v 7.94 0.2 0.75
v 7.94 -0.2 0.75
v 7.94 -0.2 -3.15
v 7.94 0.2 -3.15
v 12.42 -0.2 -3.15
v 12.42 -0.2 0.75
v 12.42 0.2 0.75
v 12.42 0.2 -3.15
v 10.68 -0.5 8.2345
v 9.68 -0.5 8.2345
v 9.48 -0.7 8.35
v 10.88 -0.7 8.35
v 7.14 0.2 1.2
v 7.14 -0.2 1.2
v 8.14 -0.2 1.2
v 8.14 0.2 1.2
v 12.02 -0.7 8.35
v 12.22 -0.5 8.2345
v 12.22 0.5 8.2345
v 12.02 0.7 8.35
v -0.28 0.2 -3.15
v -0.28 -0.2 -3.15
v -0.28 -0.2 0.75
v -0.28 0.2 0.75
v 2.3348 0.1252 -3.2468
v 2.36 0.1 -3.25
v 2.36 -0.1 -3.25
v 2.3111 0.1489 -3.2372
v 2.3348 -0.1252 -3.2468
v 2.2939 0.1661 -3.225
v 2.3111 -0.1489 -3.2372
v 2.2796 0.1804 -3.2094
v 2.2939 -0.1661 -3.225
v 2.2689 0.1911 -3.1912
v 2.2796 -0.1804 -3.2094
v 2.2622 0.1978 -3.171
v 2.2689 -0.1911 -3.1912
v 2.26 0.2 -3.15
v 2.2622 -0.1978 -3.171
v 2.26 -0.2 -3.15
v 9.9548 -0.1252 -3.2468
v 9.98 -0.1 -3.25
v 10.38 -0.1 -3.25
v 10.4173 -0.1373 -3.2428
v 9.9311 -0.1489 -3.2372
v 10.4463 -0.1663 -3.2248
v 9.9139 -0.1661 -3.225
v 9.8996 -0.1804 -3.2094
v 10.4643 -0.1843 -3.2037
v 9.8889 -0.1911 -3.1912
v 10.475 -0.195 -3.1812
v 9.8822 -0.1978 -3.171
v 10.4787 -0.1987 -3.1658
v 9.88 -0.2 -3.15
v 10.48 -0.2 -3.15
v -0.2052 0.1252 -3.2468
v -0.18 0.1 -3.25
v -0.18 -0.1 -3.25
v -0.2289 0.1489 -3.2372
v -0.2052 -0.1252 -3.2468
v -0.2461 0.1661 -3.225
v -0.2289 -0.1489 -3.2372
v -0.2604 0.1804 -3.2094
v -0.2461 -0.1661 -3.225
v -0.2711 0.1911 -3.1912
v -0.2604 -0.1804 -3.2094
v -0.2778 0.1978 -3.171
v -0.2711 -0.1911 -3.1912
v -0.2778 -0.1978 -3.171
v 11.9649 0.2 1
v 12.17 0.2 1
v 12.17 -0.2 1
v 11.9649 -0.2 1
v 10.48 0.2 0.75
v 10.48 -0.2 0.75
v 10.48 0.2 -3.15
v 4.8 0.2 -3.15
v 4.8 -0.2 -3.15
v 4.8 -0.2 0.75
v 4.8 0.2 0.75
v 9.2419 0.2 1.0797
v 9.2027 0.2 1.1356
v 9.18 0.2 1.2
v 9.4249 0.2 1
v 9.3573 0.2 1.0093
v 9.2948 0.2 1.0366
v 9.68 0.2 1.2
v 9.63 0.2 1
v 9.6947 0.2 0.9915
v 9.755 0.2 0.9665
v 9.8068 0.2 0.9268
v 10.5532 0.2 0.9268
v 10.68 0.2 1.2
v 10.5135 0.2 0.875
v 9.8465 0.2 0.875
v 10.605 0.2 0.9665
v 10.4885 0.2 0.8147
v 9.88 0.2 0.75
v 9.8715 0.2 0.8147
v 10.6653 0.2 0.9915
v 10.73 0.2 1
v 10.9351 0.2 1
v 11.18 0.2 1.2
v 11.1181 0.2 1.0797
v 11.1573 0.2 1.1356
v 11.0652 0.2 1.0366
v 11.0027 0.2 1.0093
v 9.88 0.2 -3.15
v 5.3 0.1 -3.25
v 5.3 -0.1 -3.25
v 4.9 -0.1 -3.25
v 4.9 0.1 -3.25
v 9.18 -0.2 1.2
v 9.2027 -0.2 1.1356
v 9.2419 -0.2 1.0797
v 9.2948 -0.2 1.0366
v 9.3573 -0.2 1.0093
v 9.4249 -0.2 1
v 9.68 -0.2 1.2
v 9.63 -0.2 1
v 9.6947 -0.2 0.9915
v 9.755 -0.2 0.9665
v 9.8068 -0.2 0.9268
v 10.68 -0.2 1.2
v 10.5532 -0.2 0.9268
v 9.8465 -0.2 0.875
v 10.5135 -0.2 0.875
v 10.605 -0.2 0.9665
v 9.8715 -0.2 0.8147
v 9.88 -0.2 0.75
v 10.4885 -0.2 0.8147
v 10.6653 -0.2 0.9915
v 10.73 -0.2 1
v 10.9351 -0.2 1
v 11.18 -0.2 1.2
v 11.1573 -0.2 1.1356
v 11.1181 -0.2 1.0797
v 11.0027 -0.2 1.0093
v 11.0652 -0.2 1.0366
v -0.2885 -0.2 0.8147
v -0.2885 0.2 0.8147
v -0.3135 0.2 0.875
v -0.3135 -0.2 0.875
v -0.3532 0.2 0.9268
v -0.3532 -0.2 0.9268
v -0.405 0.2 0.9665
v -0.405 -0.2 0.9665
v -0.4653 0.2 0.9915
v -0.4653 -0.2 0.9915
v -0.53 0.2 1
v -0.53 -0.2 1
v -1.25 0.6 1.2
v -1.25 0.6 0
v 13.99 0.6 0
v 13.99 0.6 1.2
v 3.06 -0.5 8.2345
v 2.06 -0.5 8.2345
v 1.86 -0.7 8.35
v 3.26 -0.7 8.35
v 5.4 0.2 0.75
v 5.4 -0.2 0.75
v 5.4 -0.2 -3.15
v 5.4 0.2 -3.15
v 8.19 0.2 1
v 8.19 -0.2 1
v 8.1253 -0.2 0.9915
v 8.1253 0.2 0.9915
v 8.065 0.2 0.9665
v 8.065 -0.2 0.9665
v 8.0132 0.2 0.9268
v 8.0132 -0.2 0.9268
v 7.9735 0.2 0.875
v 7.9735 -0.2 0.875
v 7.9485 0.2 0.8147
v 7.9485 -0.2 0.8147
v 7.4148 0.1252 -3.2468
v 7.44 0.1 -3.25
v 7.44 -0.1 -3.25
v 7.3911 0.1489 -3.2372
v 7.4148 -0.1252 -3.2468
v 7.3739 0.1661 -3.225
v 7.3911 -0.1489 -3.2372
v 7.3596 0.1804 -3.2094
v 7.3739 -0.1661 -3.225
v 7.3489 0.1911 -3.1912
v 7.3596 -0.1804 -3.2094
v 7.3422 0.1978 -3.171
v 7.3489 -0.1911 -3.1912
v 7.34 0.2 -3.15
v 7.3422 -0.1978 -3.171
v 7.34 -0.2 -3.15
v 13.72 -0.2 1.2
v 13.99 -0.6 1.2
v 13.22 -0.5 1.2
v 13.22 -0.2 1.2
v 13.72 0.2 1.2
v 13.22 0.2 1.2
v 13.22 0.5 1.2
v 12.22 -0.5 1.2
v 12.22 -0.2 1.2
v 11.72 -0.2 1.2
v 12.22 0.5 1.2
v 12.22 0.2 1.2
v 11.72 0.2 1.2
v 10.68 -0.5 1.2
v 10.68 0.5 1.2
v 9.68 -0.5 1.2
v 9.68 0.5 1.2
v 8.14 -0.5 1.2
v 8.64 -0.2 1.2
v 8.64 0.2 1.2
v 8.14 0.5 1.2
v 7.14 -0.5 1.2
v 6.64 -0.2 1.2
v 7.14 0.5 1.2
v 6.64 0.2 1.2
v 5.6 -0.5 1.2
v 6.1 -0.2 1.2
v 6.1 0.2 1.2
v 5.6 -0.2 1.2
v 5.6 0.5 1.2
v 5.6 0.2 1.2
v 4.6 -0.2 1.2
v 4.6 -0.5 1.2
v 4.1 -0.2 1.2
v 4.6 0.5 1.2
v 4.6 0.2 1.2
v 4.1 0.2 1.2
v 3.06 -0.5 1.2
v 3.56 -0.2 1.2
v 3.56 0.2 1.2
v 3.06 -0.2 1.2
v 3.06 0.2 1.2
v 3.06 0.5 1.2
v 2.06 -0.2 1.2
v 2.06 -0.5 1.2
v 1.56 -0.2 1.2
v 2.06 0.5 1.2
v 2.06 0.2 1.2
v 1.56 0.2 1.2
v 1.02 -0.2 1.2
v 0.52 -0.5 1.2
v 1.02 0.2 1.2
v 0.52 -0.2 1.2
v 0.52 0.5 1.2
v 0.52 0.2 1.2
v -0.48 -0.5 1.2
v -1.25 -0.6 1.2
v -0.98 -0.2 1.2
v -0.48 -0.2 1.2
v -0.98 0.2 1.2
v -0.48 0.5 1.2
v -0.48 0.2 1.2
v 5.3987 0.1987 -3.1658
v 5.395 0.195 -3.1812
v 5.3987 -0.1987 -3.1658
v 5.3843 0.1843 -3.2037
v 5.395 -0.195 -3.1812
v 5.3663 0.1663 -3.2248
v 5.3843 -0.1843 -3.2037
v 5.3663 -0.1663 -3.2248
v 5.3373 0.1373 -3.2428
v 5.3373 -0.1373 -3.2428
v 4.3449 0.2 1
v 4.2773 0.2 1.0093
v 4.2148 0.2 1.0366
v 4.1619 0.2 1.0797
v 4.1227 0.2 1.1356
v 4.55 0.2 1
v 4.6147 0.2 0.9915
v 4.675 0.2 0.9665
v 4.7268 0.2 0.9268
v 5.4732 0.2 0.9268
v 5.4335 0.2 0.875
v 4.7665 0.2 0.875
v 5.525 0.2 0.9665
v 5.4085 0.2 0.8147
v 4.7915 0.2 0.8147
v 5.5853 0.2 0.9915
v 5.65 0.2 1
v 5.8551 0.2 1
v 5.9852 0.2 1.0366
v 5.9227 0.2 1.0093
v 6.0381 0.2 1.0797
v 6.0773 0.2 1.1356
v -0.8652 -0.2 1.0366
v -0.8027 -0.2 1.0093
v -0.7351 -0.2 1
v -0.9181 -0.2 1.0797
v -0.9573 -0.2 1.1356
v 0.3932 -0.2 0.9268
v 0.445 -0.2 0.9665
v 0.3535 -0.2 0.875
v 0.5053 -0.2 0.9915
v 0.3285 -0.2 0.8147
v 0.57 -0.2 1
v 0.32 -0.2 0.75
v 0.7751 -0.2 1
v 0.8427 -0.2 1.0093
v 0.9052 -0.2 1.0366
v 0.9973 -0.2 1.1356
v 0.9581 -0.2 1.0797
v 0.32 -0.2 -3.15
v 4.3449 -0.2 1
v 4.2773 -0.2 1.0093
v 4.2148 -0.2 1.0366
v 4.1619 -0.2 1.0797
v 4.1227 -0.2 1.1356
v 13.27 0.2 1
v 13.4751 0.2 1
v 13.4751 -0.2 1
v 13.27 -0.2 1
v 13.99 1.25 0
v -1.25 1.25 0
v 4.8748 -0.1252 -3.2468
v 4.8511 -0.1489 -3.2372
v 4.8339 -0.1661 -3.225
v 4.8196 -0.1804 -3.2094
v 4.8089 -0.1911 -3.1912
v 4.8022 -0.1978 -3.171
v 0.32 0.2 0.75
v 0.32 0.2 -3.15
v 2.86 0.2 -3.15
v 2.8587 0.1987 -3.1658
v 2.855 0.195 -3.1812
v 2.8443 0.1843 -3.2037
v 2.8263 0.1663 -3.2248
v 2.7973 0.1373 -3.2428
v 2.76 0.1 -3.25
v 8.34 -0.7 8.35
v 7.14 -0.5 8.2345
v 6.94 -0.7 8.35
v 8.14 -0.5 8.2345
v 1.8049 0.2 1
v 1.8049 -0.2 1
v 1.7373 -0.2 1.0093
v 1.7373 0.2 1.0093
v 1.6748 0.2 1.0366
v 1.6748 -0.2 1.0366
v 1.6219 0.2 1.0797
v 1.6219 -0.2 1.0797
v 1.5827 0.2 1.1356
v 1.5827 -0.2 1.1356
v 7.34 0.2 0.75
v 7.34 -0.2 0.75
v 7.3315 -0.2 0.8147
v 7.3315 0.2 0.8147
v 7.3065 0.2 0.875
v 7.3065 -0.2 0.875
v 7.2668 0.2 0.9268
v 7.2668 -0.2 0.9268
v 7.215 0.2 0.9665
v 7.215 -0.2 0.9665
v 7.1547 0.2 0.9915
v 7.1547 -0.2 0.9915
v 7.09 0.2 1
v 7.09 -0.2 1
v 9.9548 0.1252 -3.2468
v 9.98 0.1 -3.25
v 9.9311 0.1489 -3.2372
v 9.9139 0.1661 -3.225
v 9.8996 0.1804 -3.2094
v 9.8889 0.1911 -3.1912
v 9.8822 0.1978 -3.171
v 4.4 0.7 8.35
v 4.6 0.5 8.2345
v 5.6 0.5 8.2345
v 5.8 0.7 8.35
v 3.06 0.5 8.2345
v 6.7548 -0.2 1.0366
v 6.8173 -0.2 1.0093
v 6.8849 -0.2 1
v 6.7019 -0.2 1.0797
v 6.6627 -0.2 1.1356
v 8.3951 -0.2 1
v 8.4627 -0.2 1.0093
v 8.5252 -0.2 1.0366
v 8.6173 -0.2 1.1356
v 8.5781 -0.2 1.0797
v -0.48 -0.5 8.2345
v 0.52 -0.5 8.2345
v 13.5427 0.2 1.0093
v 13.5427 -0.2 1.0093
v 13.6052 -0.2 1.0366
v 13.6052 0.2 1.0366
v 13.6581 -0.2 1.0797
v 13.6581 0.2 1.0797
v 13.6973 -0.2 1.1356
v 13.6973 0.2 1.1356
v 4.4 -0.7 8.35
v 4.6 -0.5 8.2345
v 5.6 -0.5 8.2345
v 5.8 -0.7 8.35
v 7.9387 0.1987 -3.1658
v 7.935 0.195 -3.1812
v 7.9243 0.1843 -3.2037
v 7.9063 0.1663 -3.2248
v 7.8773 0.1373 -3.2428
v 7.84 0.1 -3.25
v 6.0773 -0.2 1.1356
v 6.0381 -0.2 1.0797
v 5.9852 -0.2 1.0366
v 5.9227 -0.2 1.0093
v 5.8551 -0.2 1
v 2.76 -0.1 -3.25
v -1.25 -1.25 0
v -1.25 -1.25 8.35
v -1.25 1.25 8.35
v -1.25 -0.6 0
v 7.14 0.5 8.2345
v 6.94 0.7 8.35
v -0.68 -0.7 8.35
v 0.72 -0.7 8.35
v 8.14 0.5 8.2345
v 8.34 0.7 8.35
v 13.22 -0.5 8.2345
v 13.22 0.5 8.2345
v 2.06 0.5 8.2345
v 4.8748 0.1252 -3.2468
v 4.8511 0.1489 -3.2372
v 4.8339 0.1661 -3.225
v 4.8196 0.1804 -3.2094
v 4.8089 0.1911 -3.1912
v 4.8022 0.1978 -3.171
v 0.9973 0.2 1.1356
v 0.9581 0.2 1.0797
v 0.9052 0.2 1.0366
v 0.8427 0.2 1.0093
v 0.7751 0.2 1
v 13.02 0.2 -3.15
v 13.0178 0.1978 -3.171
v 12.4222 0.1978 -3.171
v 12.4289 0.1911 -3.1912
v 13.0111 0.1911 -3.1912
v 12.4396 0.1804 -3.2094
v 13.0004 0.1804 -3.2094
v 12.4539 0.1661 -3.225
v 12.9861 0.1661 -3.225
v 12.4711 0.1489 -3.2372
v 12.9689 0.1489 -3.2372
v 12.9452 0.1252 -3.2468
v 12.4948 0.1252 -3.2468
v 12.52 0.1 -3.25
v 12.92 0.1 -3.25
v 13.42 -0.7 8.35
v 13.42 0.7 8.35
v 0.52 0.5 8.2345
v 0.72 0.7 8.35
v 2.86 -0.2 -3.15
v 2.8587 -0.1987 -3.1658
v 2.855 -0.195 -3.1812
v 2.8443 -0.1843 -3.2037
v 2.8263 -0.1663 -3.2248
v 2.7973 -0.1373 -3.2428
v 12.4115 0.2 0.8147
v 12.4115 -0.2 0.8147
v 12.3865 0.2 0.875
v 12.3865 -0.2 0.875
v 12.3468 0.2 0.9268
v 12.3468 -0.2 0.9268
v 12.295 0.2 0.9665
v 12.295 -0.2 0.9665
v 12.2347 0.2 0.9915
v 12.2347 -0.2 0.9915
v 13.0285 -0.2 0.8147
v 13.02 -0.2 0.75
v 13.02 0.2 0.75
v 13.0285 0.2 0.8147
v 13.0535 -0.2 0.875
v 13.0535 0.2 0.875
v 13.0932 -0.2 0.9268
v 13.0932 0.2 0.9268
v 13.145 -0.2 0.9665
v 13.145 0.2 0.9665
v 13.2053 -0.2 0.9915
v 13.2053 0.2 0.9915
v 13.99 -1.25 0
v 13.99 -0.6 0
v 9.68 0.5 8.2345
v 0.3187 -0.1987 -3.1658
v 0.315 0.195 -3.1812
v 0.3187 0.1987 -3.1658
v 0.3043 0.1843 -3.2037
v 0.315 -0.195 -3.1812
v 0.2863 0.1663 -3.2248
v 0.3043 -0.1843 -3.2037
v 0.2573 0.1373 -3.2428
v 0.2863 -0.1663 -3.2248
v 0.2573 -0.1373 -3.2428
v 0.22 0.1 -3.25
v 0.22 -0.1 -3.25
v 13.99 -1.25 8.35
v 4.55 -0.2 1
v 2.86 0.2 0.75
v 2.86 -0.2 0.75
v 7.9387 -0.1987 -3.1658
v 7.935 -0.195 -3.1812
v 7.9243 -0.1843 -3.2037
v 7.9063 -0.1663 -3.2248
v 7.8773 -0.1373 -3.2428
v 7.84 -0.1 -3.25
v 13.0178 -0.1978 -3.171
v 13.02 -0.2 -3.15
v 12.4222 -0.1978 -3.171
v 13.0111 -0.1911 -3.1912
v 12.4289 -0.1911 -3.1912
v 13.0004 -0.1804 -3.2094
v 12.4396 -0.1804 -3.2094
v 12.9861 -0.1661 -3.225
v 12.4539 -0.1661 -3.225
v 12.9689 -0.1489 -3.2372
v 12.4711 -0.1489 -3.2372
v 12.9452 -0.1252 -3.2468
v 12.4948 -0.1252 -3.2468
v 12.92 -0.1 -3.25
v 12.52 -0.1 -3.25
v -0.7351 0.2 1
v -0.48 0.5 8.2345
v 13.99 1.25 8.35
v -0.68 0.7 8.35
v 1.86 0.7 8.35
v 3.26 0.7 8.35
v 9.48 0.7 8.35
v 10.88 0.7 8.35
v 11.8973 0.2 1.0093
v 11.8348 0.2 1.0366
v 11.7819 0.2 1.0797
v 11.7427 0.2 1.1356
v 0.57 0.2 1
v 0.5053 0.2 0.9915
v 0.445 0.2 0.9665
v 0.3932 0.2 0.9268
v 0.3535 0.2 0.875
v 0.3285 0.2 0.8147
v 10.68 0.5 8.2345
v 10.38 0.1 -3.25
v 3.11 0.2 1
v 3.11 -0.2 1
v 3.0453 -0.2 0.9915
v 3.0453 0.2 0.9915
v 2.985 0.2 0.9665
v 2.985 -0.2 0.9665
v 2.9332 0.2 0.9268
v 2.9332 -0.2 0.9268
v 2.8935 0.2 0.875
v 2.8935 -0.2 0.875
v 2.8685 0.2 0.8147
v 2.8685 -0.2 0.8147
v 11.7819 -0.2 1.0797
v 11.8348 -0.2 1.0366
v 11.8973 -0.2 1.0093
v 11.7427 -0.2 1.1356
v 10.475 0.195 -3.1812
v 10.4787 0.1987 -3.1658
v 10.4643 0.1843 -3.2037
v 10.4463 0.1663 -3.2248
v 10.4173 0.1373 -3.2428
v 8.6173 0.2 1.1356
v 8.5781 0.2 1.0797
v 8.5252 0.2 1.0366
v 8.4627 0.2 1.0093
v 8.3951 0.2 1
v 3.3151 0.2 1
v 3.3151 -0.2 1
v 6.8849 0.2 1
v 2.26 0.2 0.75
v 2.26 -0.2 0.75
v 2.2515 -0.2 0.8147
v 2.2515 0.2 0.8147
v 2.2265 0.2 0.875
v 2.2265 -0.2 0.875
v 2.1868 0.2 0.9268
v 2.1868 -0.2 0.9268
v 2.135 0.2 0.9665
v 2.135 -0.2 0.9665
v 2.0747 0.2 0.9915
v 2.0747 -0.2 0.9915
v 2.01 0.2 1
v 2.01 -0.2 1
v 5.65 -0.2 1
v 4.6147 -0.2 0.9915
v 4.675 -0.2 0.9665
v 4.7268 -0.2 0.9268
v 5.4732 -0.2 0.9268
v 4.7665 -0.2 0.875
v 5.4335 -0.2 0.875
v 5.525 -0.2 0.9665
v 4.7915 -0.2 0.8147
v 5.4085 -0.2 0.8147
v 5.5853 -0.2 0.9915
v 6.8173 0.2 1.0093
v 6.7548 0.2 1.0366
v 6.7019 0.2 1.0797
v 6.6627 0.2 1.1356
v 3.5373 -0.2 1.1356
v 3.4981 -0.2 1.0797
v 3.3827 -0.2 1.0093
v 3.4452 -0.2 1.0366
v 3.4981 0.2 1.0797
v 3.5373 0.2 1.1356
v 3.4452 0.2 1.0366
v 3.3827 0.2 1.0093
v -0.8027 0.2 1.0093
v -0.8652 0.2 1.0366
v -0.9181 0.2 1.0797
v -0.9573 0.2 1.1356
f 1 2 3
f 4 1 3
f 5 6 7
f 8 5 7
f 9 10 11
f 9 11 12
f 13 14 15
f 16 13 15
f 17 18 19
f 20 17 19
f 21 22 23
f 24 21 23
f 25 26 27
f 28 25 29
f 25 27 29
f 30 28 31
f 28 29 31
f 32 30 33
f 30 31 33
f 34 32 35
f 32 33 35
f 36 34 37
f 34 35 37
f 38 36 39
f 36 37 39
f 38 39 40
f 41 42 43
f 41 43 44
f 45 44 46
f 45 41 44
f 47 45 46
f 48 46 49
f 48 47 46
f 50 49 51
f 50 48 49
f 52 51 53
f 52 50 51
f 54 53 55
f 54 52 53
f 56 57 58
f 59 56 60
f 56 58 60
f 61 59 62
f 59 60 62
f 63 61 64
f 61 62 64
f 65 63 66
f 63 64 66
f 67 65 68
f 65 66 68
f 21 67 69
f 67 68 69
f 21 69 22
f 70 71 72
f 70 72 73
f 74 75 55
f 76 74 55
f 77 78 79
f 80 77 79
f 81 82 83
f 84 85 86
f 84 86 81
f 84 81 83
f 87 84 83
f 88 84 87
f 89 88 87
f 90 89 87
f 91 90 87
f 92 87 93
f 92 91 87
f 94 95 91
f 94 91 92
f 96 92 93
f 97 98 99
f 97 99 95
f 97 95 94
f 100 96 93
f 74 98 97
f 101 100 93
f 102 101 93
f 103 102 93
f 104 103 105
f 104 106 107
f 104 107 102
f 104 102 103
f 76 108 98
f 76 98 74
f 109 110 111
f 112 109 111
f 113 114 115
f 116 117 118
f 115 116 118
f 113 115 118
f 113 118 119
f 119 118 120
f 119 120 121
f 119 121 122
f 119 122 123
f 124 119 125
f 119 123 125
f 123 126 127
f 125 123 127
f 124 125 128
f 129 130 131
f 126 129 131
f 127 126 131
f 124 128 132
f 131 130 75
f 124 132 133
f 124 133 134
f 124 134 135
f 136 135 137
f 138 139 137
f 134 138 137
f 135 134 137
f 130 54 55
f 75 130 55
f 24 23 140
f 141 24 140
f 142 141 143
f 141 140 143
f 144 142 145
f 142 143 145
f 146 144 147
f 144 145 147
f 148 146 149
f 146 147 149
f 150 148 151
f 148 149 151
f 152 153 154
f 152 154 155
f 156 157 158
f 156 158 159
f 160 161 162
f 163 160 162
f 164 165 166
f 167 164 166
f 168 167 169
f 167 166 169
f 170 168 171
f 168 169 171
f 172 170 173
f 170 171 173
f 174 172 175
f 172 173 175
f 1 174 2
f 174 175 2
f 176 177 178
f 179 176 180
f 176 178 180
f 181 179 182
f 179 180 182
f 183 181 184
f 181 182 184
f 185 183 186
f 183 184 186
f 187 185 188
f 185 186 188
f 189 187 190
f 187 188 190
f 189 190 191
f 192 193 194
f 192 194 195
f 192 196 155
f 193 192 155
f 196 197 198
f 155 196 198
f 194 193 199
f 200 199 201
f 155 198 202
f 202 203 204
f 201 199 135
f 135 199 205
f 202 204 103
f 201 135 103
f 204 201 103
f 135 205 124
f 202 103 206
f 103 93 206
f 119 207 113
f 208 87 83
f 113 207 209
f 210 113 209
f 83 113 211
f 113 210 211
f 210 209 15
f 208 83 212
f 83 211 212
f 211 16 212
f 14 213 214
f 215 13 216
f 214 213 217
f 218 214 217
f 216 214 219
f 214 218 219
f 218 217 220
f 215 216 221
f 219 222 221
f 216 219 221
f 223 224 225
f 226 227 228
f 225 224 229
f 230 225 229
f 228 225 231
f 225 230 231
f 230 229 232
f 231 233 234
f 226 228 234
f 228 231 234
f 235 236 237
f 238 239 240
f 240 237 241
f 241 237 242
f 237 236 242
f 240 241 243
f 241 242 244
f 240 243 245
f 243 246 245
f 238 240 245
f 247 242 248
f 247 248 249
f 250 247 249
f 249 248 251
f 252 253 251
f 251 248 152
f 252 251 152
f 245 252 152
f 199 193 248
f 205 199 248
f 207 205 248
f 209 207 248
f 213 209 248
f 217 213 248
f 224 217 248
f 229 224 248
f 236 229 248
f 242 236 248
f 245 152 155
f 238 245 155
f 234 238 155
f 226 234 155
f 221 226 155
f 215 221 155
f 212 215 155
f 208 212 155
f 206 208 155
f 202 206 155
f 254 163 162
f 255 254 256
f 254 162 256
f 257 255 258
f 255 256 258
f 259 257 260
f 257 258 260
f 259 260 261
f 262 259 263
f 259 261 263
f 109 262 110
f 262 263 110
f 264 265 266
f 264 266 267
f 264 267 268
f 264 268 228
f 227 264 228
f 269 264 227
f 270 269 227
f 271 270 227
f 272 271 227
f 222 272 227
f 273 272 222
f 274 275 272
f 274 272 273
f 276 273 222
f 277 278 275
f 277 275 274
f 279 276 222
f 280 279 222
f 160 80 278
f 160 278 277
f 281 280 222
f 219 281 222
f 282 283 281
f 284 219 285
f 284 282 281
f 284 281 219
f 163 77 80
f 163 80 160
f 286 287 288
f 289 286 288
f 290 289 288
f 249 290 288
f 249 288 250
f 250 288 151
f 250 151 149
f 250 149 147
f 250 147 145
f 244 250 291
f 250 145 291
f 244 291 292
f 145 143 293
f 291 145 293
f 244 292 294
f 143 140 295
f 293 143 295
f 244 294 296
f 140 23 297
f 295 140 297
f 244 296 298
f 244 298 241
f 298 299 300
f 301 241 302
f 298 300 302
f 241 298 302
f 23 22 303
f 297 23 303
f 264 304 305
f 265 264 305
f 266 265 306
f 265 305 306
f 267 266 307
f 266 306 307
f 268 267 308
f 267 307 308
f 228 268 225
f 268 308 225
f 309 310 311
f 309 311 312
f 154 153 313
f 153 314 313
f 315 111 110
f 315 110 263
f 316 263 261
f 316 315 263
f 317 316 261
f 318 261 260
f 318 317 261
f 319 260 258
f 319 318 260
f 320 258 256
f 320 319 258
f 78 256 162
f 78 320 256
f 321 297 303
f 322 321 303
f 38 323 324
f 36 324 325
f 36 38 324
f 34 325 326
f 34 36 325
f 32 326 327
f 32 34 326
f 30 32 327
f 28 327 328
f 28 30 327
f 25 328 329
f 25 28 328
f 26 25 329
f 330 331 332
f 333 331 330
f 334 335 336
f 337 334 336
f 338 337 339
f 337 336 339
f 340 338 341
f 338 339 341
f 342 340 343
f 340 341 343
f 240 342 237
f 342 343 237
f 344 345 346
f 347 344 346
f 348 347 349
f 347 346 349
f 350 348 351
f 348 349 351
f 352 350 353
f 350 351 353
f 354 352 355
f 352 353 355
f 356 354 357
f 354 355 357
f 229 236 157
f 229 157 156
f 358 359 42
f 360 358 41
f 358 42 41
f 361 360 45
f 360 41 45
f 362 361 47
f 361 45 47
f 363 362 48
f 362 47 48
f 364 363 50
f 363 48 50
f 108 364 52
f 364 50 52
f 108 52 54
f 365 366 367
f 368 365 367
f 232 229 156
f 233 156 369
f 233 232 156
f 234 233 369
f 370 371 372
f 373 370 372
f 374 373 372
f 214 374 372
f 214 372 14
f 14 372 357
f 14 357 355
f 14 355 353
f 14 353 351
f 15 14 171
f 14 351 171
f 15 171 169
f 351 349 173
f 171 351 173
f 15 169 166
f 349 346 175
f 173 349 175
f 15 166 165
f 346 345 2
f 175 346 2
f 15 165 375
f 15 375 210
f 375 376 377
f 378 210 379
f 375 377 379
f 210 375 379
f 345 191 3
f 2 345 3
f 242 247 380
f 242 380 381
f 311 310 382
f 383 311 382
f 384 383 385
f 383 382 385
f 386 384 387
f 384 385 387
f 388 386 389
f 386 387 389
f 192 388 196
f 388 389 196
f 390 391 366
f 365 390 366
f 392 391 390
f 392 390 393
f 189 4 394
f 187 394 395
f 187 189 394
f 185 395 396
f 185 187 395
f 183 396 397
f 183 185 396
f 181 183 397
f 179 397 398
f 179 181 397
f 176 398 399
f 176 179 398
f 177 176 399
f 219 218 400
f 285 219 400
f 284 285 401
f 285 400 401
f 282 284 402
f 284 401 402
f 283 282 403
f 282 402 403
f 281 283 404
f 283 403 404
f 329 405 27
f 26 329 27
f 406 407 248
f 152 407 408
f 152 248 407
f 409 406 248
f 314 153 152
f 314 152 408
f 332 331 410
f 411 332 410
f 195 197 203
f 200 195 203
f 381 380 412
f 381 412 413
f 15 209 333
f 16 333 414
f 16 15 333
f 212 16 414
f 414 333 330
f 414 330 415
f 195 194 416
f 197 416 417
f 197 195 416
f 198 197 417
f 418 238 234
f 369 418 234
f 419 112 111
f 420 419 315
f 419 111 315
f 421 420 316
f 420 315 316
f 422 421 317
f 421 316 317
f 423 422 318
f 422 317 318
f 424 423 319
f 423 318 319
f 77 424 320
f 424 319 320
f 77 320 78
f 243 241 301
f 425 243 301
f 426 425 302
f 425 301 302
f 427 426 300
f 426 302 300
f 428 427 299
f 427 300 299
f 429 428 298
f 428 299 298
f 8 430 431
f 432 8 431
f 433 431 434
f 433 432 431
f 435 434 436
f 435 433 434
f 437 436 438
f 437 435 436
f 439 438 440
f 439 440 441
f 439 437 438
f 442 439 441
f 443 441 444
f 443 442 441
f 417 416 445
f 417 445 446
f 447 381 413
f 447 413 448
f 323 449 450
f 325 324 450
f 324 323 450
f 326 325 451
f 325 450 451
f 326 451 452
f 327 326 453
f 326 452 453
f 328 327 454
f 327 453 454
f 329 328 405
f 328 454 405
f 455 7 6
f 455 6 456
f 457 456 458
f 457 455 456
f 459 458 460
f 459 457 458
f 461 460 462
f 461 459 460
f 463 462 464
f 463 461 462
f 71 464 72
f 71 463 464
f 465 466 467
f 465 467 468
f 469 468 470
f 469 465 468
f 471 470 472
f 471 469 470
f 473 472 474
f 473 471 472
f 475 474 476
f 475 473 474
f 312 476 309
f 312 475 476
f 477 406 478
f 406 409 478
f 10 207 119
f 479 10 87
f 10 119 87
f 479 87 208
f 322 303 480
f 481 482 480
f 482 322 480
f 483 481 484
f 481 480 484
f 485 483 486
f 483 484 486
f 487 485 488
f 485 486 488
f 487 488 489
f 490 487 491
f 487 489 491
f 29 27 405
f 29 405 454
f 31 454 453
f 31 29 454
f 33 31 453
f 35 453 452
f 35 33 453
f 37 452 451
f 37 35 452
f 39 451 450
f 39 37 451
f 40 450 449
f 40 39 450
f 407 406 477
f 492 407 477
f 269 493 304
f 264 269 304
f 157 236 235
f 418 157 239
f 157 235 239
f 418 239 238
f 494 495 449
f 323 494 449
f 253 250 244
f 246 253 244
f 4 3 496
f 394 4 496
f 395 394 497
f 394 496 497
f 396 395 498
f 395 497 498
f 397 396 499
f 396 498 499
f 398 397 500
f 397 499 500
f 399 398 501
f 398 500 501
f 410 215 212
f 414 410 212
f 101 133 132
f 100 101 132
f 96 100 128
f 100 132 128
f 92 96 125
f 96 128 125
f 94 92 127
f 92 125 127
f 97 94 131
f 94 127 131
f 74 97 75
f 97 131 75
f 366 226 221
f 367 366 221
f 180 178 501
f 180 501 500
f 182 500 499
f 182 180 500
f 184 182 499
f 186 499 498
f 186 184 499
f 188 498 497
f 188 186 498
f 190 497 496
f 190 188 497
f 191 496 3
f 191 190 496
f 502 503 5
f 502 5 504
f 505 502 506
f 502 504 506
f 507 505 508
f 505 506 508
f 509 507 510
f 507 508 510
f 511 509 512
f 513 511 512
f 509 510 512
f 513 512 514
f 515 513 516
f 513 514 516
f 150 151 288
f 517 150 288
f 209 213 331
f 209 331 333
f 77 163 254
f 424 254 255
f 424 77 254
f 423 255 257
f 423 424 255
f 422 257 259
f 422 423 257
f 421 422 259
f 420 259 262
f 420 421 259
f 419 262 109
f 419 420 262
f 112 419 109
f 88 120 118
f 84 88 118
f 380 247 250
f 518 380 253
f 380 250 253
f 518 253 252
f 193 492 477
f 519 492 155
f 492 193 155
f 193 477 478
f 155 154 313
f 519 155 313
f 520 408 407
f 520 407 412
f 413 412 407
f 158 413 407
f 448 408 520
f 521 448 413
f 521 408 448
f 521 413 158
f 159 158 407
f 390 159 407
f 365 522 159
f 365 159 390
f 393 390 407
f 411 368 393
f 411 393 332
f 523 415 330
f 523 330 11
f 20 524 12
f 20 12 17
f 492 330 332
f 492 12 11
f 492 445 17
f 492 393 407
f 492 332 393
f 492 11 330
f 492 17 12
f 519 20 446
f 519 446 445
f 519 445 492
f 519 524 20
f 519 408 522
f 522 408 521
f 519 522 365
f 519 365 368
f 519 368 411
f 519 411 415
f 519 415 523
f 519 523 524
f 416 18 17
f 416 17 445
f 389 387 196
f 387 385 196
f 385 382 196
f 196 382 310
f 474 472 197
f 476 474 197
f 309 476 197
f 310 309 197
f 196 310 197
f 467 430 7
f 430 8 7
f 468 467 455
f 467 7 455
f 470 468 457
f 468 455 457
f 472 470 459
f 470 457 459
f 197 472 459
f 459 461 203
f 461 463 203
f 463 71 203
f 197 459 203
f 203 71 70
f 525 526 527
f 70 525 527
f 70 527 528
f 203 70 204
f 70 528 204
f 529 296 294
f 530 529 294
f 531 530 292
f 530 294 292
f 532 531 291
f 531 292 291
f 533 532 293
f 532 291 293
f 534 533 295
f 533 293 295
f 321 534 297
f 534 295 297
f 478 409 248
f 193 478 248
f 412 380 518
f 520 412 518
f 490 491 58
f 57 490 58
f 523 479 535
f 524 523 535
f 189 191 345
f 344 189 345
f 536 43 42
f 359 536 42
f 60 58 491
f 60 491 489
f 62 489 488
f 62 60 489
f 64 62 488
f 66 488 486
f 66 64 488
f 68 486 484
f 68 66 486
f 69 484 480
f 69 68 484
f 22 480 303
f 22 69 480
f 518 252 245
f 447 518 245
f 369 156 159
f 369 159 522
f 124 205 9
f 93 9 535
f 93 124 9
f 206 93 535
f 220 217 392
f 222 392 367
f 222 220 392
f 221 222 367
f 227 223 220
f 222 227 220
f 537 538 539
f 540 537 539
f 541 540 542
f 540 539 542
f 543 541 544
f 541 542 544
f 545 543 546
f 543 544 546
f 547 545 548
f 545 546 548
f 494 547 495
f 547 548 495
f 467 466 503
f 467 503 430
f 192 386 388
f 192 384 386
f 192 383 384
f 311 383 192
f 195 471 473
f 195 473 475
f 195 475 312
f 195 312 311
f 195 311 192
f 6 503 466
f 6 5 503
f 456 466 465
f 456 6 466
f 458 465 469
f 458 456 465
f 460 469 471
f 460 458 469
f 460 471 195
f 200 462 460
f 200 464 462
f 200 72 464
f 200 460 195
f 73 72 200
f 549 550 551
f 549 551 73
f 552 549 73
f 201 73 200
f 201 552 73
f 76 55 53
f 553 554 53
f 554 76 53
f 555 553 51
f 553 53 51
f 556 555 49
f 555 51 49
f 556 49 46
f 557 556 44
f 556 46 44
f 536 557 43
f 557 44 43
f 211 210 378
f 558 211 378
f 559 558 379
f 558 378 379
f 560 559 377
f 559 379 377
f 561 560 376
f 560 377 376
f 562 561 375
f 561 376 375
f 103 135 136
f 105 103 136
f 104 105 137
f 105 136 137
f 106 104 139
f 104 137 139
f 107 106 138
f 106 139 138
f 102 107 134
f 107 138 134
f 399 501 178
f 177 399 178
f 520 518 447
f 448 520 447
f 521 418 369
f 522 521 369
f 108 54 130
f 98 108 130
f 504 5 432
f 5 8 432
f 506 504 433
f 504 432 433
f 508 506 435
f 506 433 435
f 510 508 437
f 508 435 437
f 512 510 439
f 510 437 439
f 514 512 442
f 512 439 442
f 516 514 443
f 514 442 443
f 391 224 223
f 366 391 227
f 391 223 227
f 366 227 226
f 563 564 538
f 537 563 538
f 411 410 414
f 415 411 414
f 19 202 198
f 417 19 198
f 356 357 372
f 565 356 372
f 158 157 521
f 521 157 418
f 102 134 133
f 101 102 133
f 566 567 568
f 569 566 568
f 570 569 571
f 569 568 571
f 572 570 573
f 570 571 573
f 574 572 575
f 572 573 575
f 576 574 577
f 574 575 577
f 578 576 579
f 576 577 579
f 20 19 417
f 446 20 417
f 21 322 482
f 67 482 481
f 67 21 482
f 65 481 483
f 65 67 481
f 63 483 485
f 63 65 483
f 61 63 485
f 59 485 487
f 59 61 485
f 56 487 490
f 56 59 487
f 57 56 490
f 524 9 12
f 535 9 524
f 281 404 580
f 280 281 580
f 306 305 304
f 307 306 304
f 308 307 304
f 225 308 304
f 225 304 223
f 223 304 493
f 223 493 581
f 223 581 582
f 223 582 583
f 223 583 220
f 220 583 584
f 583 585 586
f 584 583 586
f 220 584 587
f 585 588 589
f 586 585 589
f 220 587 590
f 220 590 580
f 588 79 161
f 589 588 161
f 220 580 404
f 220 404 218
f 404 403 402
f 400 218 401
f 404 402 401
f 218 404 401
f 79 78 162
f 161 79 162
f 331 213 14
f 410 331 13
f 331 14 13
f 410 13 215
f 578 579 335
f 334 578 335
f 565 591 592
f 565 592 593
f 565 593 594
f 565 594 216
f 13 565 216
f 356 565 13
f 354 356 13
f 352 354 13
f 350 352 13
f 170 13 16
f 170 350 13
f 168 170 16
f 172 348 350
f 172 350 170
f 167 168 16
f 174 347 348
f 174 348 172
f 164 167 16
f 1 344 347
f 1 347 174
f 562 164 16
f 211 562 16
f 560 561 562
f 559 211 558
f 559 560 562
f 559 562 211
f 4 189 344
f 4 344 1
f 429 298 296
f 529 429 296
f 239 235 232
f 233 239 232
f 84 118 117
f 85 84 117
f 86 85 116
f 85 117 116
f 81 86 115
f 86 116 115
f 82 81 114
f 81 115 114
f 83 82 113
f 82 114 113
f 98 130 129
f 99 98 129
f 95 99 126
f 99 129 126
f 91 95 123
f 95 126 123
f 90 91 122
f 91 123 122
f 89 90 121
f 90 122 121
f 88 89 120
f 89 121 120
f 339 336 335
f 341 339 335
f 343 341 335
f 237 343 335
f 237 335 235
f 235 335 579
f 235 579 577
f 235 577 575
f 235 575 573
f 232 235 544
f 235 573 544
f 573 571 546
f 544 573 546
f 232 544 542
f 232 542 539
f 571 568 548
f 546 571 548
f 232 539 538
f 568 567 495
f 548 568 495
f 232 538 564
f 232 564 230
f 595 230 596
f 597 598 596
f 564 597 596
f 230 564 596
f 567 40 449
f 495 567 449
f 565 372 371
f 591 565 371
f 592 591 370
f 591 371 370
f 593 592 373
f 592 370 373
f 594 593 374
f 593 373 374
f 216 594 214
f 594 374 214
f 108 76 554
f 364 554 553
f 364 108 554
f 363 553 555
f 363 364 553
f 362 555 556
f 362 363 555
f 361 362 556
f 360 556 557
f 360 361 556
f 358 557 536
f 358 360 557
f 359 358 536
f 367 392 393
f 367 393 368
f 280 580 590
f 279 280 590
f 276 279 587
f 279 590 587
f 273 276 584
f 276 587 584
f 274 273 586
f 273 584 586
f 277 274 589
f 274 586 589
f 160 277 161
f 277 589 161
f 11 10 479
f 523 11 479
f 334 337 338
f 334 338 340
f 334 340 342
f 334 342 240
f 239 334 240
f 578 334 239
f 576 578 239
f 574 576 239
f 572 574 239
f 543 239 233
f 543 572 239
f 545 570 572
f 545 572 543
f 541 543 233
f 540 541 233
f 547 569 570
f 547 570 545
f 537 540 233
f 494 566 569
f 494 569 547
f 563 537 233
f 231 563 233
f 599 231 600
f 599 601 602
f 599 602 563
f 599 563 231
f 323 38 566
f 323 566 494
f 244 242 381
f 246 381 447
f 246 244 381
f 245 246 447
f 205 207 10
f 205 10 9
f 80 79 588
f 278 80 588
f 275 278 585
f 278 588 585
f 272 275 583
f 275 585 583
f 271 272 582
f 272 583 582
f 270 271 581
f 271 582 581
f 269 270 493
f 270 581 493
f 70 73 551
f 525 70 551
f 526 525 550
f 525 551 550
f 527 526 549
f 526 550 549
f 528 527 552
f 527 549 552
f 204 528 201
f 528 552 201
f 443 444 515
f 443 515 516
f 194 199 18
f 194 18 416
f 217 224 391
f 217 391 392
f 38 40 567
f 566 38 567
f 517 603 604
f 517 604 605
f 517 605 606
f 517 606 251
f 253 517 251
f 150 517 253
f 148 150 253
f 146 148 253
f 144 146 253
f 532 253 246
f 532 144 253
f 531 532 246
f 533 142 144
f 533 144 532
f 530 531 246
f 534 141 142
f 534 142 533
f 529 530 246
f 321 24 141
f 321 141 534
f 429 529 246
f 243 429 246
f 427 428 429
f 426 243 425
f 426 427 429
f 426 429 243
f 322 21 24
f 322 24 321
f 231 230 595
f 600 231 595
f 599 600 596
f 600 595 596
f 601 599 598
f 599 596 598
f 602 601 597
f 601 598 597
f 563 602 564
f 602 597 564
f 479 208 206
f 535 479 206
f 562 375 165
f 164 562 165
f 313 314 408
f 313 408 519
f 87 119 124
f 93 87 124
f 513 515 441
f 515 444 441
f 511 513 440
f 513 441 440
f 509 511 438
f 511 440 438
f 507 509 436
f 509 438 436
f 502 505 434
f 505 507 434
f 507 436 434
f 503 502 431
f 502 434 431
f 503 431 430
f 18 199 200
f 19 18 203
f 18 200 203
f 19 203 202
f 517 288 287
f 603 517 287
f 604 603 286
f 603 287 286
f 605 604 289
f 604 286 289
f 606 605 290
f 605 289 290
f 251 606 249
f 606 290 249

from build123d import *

# Parameters (mm, degrees)
SKETCH1_W                   = 2.54
SKETCH1_H                   = 2.5
SKETCH1_W_2                 = 1
SKETCH1_H_2                 = 1
BOSS_EXTRUDE1_DEPTH         = 8.35
CHAMFER1_SIZE               = 0.2
CHAMFER1_SIZE2              = 0.115470054
LPATTERN2_COUNT             = 6
LPATTERN2_PITCH             = 2.54
CHAMFER1_OF_LPATTERN2_SIZE2 = 0.115470054
CHAMFER1_OF_LPATTERN2_SIZE  = 0.2
SKETCH4_W                   = 1.2
SKETCH4_H                   = 1.2
CUT_EXTRUDE1_DEPTH          = 18.422473992
SKETCH3_W                   = 0.7
SKETCH3_H                   = 0.4
SKETCH3_W_2                 = 0.6
BOSS_EXTRUDE2_DEPTH         = 0.2
SKETCH3_3_W                 = 0.6
SKETCH3_3_H                 = 0.4
BOSS_EXTRUDE3_DEPTH         = 4.45
FILLET1_R                   = 0.1
FILLET2_R                   = 0.25
LPATTERN3_START             = -0.2
LPATTERN3_DEPTH             = 0.4
LPATTERN3_START_2           = -1
LPATTERN3_2_DEPTH           = 12


with BuildPart() as part:
    # Sketch1 → Boss-Extrude1 (new body)
    with BuildSketch(Plane.XY):
        with Locations((0.02, 0)):
            Rectangle(SKETCH1_W, SKETCH1_H)
        with Locations((0.02, 0)):
            Rectangle(SKETCH1_W_2, SKETCH1_H_2, mode=Mode.SUBTRACT)
    boss_extrude1 = extrude(amount=BOSS_EXTRUDE1_DEPTH)

    # Chamfer1
    chamfer1_edges = [part.edges().sort_by_distance(p)[0] for p in [
        (-0.48, 0, 8.35),
        (0.02, -0.5, 8.35),
        (0.52, 0, 8.35),
        (0.02, 0.5, 8.35),
    ]]
    chamfer1_side = [part.faces().sort_by_distance(p)[0] for p in [
        (0.02, -1.214360696, 8.35),
    ]]
    chamfer(chamfer1_edges, length=CHAMFER1_SIZE, length2=CHAMFER1_SIZE2, reference=chamfer1_side[0])

    # LPattern2: Boss-Extrude1 ×6
    with Locations(*[(i * LPATTERN2_PITCH, 0, 0) for i in range(1, LPATTERN2_COUNT)]):
        add(boss_extrude1)

    # Chamfer1 of LPattern2
    chamfer1_of_lpattern2_edges = [part.edges().sort_by_distance(p)[0] for p in [
        (2.06, 0, 8.35),
        (2.56, -0.5, 8.35),
        (3.06, 0, 8.35),
        (2.56, 0.5, 8.35),
        (4.6, 0, 8.35),
        (5.1, -0.5, 8.35),
        (5.6, 0, 8.35),
        (5.1, 0.5, 8.35),
        (7.14, 0, 8.35),
        (7.64, -0.5, 8.35),
        (8.14, 0, 8.35),
        (7.64, 0.5, 8.35),
        (9.68, 0, 8.35),
        (10.18, -0.5, 8.35),
        (10.68, 0, 8.35),
        (10.18, 0.5, 8.35),
        (12.22, 0, 8.35),
        (12.72, -0.5, 8.35),
        (13.22, 0, 8.35),
        (12.72, 0.5, 8.35),
    ]]
    chamfer(chamfer1_of_lpattern2_edges, length=CHAMFER1_OF_LPATTERN2_SIZE, length2=CHAMFER1_OF_LPATTERN2_SIZE2)

    # Sketch4 → Cut-Extrude1 (cut, through all)
    with BuildSketch(Plane.ZY.offset(1.25)):
        with Locations((0.6, 0)):
            Rectangle(SKETCH4_W, SKETCH4_H)
    extrude(amount=-CUT_EXTRUDE1_DEPTH, mode=Mode.SUBTRACT)

    # Sketch3 → Boss-Extrude2 (add)
    with BuildSketch(Plane(origin=(0, 0, 1.2), x_dir=(-1, 0, 0), z_dir=(0, 0, -1))):
        with Locations((-13.37, 0)):
            Rectangle(SKETCH3_W, SKETCH3_H)
        with Locations((-12.07, 0)):
            Rectangle(SKETCH3_W, SKETCH3_H)
        with Locations((-12.72, 0)):
            Rectangle(SKETCH3_W_2, SKETCH3_H)
    extrude(amount=BOSS_EXTRUDE2_DEPTH)

    # Sketch3<3> → Boss-Extrude3 (add)
    with BuildSketch(Plane(origin=(0, 0, 1.2), x_dir=(-1, 0, 0), z_dir=(0, 0, -1))):
        with Locations((-12.72, 0)):
            Rectangle(SKETCH3_3_W, SKETCH3_3_H)
    extrude(amount=BOSS_EXTRUDE3_DEPTH)

    # Fillet1
    fillet1_edges = [part.edges().sort_by_distance(p)[0] for p in [
        (12.42, 0, -3.25),
        (12.72, -0.2, -3.25),
        (12.72, 0.2, -3.25),
        (13.02, 0, -3.25),
    ]]
    fillet(fillet1_edges, radius=FILLET1_R)

    # Fillet2
    # the kernel refuses this fillet: 0.25 mm, written as the material it adds along each edge
    with BuildSketch(Plane(origin=(13.02, -0.2, 1), x_dir=(0, 0, -1), z_dir=(0, 1, 0)), Plane(origin=(12.42, 0.2, 1), x_dir=(0, 0, -1), z_dir=(0, -1, 0))) as fillet2_piece_1:
        with BuildLine():
            CenterArc((FILLET2_R, -FILLET2_R), FILLET2_R, 90, 90)
            Line((0, -FILLET2_R), (0, 0))
            Line((0, 0), (FILLET2_R, 0))
        make_face()
    extrude(amount=0.4)
    # the kernel refuses this fillet: 0.25 mm, written as the material it takes off along each edge
    with BuildSketch(Plane(origin=(11.72, -0.812372436, 1), x_dir=(1, 0, 0), z_dir=(0, 1, 0))) as fillet2_2_piece_1_section:
        with BuildLine():
            CenterArc((0.244948974, -0.25), FILLET2_R, 90, 78.463040967)
            Line((0, -0.2), (0, 0))
            Line((0, 0), (0.244948974, 0))
        make_face()
    fillet2_2_piece_1 = extrude(amount=1.624744871, mode=Mode.PRIVATE)
    fillet2_2_piece_1 = split(fillet2_2_piece_1, bisect_by=Plane(origin=(11.72, -0.6, 1), z_dir=(0, 1, 0)), keep=Keep.TOP, mode=Mode.PRIVATE)
    fillet2_2_piece_1 = split(fillet2_2_piece_1, bisect_by=Plane(origin=(11.72, 0.6, 1), z_dir=(0, -1, 0)), keep=Keep.TOP, mode=Mode.PRIVATE)
    add(fillet2_2_piece_1, mode=Mode.SUBTRACT)
    with BuildSketch(Plane(origin=(13.72, 0.812372436, 1), x_dir=(-1, 0, 0), z_dir=(0, -1, 0))) as fillet2_2_piece_2_section:
        with BuildLine():
            CenterArc((0.244948974, -0.25), FILLET2_R, 90, 78.463040967)
            Line((0, -0.2), (0, 0))
            Line((0, 0), (0.244948974, 0))
        make_face()
    fillet2_2_piece_2 = extrude(amount=1.624744871, mode=Mode.PRIVATE)
    fillet2_2_piece_2 = split(fillet2_2_piece_2, bisect_by=Plane(origin=(13.72, -0.6, 1), z_dir=(0, 1, 0)), keep=Keep.TOP, mode=Mode.PRIVATE)
    fillet2_2_piece_2 = split(fillet2_2_piece_2, bisect_by=Plane(origin=(13.72, 0.6, 1), z_dir=(0, -1, 0)), keep=Keep.TOP, mode=Mode.PRIVATE)
    add(fillet2_2_piece_2, mode=Mode.SUBTRACT)

    # LPattern3: read off the stored shape, not the designer's step
    # LPattern3 outline → LPattern3 (add)
    with BuildSketch(Plane(origin=(0, 0, 0), x_dir=(1, 0, 0), z_dir=(0, 1, 0)).offset(LPATTERN3_START)):
        with BuildLine():
            ThreePointArc((9.424948974, -1), (9.266835091, -1.056350833), (9.18, -1.2))
            Line((9.18, -1.2), (11.18, -1.2))
            ThreePointArc((11.18, -1.2), (11.093164909, -1.056350833), (10.935051026, -1))
            Line((10.935051026, -1), (10.73, -1))
            ThreePointArc((10.73, -1), (10.553223305, -0.926776695), (10.48, -0.75))
            Line((10.48, -0.75), (10.48, 3.15))
            ThreePointArc((10.48, 3.15), (10.450710678, 3.220710678), (10.38, 3.25))
            Line((10.38, 3.25), (9.98, 3.25))
            ThreePointArc((9.98, 3.25), (9.909289322, 3.220710678), (9.88, 3.15))
            Line((9.88, 3.15), (9.88, -0.75))
            ThreePointArc((9.88, -0.75), (9.806776695, -0.926776695), (9.63, -1))
            Line((9.63, -1), (9.424948974, -1))
        make_face()
        with BuildLine():
            ThreePointArc((6.884948974, -1), (6.726835091, -1.056350833), (6.64, -1.2))
            Line((6.64, -1.2), (8.64, -1.2))
            ThreePointArc((8.64, -1.2), (8.553164909, -1.056350833), (8.395051026, -1))
            Line((8.395051026, -1), (8.19, -1))
            ThreePointArc((8.19, -1), (8.013223305, -0.926776695), (7.94, -0.75))
            Line((7.94, -0.75), (7.94, 3.15))
            ThreePointArc((7.94, 3.15), (7.910710678, 3.220710678), (7.84, 3.25))
            Line((7.84, 3.25), (7.44, 3.25))
            ThreePointArc((7.44, 3.25), (7.369289322, 3.220710678), (7.34, 3.15))
            Line((7.34, 3.15), (7.34, -0.75))
            ThreePointArc((7.34, -0.75), (7.266776695, -0.926776695), (7.09, -1))
            Line((7.09, -1), (6.884948974, -1))
        make_face()
        with BuildLine():
            ThreePointArc((4.344948974, -1), (4.186835091, -1.056350833), (4.1, -1.2))
            Line((4.1, -1.2), (6.1, -1.2))
            ThreePointArc((6.1, -1.2), (6.013164909, -1.056350833), (5.855051026, -1))
            Line((5.855051026, -1), (5.65, -1))
            ThreePointArc((5.65, -1), (5.473223305, -0.926776695), (5.4, -0.75))
            Line((5.4, -0.75), (5.4, 3.15))
            ThreePointArc((5.4, 3.15), (5.370710678, 3.220710678), (5.3, 3.25))
            Line((5.3, 3.25), (4.9, 3.25))
            ThreePointArc((4.9, 3.25), (4.829289322, 3.220710678), (4.8, 3.15))
            Line((4.8, 3.15), (4.8, -0.75))
            ThreePointArc((4.8, -0.75), (4.726776695, -0.926776695), (4.55, -1))
            Line((4.55, -1), (4.344948974, -1))
        make_face()
        with BuildLine():
            ThreePointArc((1.804948974, -1), (1.646835091, -1.056350833), (1.56, -1.2))
            Line((1.56, -1.2), (3.56, -1.2))
            ThreePointArc((3.56, -1.2), (3.473164909, -1.056350833), (3.315051026, -1))
            Line((3.315051026, -1), (3.11, -1))
            ThreePointArc((3.11, -1), (2.933223305, -0.926776695), (2.86, -0.75))
            Line((2.86, -0.75), (2.86, 3.15))
            ThreePointArc((2.86, 3.15), (2.830710678, 3.220710678), (2.76, 3.25))
            Line((2.76, 3.25), (2.36, 3.25))
            ThreePointArc((2.36, 3.25), (2.289289322, 3.220710678), (2.26, 3.15))
            Line((2.26, 3.15), (2.26, -0.75))
            ThreePointArc((2.26, -0.75), (2.186776695, -0.926776695), (2.01, -1))
            Line((2.01, -1), (1.804948974, -1))
        make_face()
        with BuildLine():
            Line((0.775051026, -1), (0.57, -1))
            ThreePointArc((0.57, -1), (0.393223305, -0.926776695), (0.32, -0.75))
            Line((0.32, -0.75), (0.32, 3.15))
            ThreePointArc((0.32, 3.15), (0.290710678, 3.220710678), (0.22, 3.25))
            Line((0.22, 3.25), (-0.18, 3.25))
            ThreePointArc((-0.18, 3.25), (-0.250710678, 3.220710678), (-0.28, 3.15))
            Line((-0.28, 3.15), (-0.28, -0.75))
            ThreePointArc((-0.28, -0.75), (-0.353223305, -0.926776695), (-0.53, -1))
            Line((-0.53, -1), (-0.735051026, -1))
            ThreePointArc((-0.735051026, -1), (-0.893164909, -1.056350833), (-0.98, -1.2))
            Line((-0.98, -1.2), (1.02, -1.2))
            ThreePointArc((1.02, -1.2), (0.933164909, -1.056350833), (0.775051026, -1))
        make_face()
    extrude(amount=LPATTERN3_DEPTH)

    # LPattern3 2 outline → LPattern3 2 (cut)
    with BuildSketch(Plane.YZ.offset(LPATTERN3_START_2)):
        with BuildLine():
            Line((0.2, -3.25), (0.2, -3.15))
            ThreePointArc((0.2, -3.15), (0.170710678, -3.220710678), (0.1, -3.25))
            Line((0.1, -3.25), (0.2, -3.25))
        make_face()
        with BuildLine():
            Line((-0.2, -3.25), (-0.1, -3.25))
            ThreePointArc((-0.1, -3.25), (-0.170710678, -3.220710678), (-0.2, -3.15))
            Line((-0.2, -3.15), (-0.2, -3.25))
        make_face()
    extrude(amount=LPATTERN3_2_DEPTH, mode=Mode.SUBTRACT)


solid = part.part
